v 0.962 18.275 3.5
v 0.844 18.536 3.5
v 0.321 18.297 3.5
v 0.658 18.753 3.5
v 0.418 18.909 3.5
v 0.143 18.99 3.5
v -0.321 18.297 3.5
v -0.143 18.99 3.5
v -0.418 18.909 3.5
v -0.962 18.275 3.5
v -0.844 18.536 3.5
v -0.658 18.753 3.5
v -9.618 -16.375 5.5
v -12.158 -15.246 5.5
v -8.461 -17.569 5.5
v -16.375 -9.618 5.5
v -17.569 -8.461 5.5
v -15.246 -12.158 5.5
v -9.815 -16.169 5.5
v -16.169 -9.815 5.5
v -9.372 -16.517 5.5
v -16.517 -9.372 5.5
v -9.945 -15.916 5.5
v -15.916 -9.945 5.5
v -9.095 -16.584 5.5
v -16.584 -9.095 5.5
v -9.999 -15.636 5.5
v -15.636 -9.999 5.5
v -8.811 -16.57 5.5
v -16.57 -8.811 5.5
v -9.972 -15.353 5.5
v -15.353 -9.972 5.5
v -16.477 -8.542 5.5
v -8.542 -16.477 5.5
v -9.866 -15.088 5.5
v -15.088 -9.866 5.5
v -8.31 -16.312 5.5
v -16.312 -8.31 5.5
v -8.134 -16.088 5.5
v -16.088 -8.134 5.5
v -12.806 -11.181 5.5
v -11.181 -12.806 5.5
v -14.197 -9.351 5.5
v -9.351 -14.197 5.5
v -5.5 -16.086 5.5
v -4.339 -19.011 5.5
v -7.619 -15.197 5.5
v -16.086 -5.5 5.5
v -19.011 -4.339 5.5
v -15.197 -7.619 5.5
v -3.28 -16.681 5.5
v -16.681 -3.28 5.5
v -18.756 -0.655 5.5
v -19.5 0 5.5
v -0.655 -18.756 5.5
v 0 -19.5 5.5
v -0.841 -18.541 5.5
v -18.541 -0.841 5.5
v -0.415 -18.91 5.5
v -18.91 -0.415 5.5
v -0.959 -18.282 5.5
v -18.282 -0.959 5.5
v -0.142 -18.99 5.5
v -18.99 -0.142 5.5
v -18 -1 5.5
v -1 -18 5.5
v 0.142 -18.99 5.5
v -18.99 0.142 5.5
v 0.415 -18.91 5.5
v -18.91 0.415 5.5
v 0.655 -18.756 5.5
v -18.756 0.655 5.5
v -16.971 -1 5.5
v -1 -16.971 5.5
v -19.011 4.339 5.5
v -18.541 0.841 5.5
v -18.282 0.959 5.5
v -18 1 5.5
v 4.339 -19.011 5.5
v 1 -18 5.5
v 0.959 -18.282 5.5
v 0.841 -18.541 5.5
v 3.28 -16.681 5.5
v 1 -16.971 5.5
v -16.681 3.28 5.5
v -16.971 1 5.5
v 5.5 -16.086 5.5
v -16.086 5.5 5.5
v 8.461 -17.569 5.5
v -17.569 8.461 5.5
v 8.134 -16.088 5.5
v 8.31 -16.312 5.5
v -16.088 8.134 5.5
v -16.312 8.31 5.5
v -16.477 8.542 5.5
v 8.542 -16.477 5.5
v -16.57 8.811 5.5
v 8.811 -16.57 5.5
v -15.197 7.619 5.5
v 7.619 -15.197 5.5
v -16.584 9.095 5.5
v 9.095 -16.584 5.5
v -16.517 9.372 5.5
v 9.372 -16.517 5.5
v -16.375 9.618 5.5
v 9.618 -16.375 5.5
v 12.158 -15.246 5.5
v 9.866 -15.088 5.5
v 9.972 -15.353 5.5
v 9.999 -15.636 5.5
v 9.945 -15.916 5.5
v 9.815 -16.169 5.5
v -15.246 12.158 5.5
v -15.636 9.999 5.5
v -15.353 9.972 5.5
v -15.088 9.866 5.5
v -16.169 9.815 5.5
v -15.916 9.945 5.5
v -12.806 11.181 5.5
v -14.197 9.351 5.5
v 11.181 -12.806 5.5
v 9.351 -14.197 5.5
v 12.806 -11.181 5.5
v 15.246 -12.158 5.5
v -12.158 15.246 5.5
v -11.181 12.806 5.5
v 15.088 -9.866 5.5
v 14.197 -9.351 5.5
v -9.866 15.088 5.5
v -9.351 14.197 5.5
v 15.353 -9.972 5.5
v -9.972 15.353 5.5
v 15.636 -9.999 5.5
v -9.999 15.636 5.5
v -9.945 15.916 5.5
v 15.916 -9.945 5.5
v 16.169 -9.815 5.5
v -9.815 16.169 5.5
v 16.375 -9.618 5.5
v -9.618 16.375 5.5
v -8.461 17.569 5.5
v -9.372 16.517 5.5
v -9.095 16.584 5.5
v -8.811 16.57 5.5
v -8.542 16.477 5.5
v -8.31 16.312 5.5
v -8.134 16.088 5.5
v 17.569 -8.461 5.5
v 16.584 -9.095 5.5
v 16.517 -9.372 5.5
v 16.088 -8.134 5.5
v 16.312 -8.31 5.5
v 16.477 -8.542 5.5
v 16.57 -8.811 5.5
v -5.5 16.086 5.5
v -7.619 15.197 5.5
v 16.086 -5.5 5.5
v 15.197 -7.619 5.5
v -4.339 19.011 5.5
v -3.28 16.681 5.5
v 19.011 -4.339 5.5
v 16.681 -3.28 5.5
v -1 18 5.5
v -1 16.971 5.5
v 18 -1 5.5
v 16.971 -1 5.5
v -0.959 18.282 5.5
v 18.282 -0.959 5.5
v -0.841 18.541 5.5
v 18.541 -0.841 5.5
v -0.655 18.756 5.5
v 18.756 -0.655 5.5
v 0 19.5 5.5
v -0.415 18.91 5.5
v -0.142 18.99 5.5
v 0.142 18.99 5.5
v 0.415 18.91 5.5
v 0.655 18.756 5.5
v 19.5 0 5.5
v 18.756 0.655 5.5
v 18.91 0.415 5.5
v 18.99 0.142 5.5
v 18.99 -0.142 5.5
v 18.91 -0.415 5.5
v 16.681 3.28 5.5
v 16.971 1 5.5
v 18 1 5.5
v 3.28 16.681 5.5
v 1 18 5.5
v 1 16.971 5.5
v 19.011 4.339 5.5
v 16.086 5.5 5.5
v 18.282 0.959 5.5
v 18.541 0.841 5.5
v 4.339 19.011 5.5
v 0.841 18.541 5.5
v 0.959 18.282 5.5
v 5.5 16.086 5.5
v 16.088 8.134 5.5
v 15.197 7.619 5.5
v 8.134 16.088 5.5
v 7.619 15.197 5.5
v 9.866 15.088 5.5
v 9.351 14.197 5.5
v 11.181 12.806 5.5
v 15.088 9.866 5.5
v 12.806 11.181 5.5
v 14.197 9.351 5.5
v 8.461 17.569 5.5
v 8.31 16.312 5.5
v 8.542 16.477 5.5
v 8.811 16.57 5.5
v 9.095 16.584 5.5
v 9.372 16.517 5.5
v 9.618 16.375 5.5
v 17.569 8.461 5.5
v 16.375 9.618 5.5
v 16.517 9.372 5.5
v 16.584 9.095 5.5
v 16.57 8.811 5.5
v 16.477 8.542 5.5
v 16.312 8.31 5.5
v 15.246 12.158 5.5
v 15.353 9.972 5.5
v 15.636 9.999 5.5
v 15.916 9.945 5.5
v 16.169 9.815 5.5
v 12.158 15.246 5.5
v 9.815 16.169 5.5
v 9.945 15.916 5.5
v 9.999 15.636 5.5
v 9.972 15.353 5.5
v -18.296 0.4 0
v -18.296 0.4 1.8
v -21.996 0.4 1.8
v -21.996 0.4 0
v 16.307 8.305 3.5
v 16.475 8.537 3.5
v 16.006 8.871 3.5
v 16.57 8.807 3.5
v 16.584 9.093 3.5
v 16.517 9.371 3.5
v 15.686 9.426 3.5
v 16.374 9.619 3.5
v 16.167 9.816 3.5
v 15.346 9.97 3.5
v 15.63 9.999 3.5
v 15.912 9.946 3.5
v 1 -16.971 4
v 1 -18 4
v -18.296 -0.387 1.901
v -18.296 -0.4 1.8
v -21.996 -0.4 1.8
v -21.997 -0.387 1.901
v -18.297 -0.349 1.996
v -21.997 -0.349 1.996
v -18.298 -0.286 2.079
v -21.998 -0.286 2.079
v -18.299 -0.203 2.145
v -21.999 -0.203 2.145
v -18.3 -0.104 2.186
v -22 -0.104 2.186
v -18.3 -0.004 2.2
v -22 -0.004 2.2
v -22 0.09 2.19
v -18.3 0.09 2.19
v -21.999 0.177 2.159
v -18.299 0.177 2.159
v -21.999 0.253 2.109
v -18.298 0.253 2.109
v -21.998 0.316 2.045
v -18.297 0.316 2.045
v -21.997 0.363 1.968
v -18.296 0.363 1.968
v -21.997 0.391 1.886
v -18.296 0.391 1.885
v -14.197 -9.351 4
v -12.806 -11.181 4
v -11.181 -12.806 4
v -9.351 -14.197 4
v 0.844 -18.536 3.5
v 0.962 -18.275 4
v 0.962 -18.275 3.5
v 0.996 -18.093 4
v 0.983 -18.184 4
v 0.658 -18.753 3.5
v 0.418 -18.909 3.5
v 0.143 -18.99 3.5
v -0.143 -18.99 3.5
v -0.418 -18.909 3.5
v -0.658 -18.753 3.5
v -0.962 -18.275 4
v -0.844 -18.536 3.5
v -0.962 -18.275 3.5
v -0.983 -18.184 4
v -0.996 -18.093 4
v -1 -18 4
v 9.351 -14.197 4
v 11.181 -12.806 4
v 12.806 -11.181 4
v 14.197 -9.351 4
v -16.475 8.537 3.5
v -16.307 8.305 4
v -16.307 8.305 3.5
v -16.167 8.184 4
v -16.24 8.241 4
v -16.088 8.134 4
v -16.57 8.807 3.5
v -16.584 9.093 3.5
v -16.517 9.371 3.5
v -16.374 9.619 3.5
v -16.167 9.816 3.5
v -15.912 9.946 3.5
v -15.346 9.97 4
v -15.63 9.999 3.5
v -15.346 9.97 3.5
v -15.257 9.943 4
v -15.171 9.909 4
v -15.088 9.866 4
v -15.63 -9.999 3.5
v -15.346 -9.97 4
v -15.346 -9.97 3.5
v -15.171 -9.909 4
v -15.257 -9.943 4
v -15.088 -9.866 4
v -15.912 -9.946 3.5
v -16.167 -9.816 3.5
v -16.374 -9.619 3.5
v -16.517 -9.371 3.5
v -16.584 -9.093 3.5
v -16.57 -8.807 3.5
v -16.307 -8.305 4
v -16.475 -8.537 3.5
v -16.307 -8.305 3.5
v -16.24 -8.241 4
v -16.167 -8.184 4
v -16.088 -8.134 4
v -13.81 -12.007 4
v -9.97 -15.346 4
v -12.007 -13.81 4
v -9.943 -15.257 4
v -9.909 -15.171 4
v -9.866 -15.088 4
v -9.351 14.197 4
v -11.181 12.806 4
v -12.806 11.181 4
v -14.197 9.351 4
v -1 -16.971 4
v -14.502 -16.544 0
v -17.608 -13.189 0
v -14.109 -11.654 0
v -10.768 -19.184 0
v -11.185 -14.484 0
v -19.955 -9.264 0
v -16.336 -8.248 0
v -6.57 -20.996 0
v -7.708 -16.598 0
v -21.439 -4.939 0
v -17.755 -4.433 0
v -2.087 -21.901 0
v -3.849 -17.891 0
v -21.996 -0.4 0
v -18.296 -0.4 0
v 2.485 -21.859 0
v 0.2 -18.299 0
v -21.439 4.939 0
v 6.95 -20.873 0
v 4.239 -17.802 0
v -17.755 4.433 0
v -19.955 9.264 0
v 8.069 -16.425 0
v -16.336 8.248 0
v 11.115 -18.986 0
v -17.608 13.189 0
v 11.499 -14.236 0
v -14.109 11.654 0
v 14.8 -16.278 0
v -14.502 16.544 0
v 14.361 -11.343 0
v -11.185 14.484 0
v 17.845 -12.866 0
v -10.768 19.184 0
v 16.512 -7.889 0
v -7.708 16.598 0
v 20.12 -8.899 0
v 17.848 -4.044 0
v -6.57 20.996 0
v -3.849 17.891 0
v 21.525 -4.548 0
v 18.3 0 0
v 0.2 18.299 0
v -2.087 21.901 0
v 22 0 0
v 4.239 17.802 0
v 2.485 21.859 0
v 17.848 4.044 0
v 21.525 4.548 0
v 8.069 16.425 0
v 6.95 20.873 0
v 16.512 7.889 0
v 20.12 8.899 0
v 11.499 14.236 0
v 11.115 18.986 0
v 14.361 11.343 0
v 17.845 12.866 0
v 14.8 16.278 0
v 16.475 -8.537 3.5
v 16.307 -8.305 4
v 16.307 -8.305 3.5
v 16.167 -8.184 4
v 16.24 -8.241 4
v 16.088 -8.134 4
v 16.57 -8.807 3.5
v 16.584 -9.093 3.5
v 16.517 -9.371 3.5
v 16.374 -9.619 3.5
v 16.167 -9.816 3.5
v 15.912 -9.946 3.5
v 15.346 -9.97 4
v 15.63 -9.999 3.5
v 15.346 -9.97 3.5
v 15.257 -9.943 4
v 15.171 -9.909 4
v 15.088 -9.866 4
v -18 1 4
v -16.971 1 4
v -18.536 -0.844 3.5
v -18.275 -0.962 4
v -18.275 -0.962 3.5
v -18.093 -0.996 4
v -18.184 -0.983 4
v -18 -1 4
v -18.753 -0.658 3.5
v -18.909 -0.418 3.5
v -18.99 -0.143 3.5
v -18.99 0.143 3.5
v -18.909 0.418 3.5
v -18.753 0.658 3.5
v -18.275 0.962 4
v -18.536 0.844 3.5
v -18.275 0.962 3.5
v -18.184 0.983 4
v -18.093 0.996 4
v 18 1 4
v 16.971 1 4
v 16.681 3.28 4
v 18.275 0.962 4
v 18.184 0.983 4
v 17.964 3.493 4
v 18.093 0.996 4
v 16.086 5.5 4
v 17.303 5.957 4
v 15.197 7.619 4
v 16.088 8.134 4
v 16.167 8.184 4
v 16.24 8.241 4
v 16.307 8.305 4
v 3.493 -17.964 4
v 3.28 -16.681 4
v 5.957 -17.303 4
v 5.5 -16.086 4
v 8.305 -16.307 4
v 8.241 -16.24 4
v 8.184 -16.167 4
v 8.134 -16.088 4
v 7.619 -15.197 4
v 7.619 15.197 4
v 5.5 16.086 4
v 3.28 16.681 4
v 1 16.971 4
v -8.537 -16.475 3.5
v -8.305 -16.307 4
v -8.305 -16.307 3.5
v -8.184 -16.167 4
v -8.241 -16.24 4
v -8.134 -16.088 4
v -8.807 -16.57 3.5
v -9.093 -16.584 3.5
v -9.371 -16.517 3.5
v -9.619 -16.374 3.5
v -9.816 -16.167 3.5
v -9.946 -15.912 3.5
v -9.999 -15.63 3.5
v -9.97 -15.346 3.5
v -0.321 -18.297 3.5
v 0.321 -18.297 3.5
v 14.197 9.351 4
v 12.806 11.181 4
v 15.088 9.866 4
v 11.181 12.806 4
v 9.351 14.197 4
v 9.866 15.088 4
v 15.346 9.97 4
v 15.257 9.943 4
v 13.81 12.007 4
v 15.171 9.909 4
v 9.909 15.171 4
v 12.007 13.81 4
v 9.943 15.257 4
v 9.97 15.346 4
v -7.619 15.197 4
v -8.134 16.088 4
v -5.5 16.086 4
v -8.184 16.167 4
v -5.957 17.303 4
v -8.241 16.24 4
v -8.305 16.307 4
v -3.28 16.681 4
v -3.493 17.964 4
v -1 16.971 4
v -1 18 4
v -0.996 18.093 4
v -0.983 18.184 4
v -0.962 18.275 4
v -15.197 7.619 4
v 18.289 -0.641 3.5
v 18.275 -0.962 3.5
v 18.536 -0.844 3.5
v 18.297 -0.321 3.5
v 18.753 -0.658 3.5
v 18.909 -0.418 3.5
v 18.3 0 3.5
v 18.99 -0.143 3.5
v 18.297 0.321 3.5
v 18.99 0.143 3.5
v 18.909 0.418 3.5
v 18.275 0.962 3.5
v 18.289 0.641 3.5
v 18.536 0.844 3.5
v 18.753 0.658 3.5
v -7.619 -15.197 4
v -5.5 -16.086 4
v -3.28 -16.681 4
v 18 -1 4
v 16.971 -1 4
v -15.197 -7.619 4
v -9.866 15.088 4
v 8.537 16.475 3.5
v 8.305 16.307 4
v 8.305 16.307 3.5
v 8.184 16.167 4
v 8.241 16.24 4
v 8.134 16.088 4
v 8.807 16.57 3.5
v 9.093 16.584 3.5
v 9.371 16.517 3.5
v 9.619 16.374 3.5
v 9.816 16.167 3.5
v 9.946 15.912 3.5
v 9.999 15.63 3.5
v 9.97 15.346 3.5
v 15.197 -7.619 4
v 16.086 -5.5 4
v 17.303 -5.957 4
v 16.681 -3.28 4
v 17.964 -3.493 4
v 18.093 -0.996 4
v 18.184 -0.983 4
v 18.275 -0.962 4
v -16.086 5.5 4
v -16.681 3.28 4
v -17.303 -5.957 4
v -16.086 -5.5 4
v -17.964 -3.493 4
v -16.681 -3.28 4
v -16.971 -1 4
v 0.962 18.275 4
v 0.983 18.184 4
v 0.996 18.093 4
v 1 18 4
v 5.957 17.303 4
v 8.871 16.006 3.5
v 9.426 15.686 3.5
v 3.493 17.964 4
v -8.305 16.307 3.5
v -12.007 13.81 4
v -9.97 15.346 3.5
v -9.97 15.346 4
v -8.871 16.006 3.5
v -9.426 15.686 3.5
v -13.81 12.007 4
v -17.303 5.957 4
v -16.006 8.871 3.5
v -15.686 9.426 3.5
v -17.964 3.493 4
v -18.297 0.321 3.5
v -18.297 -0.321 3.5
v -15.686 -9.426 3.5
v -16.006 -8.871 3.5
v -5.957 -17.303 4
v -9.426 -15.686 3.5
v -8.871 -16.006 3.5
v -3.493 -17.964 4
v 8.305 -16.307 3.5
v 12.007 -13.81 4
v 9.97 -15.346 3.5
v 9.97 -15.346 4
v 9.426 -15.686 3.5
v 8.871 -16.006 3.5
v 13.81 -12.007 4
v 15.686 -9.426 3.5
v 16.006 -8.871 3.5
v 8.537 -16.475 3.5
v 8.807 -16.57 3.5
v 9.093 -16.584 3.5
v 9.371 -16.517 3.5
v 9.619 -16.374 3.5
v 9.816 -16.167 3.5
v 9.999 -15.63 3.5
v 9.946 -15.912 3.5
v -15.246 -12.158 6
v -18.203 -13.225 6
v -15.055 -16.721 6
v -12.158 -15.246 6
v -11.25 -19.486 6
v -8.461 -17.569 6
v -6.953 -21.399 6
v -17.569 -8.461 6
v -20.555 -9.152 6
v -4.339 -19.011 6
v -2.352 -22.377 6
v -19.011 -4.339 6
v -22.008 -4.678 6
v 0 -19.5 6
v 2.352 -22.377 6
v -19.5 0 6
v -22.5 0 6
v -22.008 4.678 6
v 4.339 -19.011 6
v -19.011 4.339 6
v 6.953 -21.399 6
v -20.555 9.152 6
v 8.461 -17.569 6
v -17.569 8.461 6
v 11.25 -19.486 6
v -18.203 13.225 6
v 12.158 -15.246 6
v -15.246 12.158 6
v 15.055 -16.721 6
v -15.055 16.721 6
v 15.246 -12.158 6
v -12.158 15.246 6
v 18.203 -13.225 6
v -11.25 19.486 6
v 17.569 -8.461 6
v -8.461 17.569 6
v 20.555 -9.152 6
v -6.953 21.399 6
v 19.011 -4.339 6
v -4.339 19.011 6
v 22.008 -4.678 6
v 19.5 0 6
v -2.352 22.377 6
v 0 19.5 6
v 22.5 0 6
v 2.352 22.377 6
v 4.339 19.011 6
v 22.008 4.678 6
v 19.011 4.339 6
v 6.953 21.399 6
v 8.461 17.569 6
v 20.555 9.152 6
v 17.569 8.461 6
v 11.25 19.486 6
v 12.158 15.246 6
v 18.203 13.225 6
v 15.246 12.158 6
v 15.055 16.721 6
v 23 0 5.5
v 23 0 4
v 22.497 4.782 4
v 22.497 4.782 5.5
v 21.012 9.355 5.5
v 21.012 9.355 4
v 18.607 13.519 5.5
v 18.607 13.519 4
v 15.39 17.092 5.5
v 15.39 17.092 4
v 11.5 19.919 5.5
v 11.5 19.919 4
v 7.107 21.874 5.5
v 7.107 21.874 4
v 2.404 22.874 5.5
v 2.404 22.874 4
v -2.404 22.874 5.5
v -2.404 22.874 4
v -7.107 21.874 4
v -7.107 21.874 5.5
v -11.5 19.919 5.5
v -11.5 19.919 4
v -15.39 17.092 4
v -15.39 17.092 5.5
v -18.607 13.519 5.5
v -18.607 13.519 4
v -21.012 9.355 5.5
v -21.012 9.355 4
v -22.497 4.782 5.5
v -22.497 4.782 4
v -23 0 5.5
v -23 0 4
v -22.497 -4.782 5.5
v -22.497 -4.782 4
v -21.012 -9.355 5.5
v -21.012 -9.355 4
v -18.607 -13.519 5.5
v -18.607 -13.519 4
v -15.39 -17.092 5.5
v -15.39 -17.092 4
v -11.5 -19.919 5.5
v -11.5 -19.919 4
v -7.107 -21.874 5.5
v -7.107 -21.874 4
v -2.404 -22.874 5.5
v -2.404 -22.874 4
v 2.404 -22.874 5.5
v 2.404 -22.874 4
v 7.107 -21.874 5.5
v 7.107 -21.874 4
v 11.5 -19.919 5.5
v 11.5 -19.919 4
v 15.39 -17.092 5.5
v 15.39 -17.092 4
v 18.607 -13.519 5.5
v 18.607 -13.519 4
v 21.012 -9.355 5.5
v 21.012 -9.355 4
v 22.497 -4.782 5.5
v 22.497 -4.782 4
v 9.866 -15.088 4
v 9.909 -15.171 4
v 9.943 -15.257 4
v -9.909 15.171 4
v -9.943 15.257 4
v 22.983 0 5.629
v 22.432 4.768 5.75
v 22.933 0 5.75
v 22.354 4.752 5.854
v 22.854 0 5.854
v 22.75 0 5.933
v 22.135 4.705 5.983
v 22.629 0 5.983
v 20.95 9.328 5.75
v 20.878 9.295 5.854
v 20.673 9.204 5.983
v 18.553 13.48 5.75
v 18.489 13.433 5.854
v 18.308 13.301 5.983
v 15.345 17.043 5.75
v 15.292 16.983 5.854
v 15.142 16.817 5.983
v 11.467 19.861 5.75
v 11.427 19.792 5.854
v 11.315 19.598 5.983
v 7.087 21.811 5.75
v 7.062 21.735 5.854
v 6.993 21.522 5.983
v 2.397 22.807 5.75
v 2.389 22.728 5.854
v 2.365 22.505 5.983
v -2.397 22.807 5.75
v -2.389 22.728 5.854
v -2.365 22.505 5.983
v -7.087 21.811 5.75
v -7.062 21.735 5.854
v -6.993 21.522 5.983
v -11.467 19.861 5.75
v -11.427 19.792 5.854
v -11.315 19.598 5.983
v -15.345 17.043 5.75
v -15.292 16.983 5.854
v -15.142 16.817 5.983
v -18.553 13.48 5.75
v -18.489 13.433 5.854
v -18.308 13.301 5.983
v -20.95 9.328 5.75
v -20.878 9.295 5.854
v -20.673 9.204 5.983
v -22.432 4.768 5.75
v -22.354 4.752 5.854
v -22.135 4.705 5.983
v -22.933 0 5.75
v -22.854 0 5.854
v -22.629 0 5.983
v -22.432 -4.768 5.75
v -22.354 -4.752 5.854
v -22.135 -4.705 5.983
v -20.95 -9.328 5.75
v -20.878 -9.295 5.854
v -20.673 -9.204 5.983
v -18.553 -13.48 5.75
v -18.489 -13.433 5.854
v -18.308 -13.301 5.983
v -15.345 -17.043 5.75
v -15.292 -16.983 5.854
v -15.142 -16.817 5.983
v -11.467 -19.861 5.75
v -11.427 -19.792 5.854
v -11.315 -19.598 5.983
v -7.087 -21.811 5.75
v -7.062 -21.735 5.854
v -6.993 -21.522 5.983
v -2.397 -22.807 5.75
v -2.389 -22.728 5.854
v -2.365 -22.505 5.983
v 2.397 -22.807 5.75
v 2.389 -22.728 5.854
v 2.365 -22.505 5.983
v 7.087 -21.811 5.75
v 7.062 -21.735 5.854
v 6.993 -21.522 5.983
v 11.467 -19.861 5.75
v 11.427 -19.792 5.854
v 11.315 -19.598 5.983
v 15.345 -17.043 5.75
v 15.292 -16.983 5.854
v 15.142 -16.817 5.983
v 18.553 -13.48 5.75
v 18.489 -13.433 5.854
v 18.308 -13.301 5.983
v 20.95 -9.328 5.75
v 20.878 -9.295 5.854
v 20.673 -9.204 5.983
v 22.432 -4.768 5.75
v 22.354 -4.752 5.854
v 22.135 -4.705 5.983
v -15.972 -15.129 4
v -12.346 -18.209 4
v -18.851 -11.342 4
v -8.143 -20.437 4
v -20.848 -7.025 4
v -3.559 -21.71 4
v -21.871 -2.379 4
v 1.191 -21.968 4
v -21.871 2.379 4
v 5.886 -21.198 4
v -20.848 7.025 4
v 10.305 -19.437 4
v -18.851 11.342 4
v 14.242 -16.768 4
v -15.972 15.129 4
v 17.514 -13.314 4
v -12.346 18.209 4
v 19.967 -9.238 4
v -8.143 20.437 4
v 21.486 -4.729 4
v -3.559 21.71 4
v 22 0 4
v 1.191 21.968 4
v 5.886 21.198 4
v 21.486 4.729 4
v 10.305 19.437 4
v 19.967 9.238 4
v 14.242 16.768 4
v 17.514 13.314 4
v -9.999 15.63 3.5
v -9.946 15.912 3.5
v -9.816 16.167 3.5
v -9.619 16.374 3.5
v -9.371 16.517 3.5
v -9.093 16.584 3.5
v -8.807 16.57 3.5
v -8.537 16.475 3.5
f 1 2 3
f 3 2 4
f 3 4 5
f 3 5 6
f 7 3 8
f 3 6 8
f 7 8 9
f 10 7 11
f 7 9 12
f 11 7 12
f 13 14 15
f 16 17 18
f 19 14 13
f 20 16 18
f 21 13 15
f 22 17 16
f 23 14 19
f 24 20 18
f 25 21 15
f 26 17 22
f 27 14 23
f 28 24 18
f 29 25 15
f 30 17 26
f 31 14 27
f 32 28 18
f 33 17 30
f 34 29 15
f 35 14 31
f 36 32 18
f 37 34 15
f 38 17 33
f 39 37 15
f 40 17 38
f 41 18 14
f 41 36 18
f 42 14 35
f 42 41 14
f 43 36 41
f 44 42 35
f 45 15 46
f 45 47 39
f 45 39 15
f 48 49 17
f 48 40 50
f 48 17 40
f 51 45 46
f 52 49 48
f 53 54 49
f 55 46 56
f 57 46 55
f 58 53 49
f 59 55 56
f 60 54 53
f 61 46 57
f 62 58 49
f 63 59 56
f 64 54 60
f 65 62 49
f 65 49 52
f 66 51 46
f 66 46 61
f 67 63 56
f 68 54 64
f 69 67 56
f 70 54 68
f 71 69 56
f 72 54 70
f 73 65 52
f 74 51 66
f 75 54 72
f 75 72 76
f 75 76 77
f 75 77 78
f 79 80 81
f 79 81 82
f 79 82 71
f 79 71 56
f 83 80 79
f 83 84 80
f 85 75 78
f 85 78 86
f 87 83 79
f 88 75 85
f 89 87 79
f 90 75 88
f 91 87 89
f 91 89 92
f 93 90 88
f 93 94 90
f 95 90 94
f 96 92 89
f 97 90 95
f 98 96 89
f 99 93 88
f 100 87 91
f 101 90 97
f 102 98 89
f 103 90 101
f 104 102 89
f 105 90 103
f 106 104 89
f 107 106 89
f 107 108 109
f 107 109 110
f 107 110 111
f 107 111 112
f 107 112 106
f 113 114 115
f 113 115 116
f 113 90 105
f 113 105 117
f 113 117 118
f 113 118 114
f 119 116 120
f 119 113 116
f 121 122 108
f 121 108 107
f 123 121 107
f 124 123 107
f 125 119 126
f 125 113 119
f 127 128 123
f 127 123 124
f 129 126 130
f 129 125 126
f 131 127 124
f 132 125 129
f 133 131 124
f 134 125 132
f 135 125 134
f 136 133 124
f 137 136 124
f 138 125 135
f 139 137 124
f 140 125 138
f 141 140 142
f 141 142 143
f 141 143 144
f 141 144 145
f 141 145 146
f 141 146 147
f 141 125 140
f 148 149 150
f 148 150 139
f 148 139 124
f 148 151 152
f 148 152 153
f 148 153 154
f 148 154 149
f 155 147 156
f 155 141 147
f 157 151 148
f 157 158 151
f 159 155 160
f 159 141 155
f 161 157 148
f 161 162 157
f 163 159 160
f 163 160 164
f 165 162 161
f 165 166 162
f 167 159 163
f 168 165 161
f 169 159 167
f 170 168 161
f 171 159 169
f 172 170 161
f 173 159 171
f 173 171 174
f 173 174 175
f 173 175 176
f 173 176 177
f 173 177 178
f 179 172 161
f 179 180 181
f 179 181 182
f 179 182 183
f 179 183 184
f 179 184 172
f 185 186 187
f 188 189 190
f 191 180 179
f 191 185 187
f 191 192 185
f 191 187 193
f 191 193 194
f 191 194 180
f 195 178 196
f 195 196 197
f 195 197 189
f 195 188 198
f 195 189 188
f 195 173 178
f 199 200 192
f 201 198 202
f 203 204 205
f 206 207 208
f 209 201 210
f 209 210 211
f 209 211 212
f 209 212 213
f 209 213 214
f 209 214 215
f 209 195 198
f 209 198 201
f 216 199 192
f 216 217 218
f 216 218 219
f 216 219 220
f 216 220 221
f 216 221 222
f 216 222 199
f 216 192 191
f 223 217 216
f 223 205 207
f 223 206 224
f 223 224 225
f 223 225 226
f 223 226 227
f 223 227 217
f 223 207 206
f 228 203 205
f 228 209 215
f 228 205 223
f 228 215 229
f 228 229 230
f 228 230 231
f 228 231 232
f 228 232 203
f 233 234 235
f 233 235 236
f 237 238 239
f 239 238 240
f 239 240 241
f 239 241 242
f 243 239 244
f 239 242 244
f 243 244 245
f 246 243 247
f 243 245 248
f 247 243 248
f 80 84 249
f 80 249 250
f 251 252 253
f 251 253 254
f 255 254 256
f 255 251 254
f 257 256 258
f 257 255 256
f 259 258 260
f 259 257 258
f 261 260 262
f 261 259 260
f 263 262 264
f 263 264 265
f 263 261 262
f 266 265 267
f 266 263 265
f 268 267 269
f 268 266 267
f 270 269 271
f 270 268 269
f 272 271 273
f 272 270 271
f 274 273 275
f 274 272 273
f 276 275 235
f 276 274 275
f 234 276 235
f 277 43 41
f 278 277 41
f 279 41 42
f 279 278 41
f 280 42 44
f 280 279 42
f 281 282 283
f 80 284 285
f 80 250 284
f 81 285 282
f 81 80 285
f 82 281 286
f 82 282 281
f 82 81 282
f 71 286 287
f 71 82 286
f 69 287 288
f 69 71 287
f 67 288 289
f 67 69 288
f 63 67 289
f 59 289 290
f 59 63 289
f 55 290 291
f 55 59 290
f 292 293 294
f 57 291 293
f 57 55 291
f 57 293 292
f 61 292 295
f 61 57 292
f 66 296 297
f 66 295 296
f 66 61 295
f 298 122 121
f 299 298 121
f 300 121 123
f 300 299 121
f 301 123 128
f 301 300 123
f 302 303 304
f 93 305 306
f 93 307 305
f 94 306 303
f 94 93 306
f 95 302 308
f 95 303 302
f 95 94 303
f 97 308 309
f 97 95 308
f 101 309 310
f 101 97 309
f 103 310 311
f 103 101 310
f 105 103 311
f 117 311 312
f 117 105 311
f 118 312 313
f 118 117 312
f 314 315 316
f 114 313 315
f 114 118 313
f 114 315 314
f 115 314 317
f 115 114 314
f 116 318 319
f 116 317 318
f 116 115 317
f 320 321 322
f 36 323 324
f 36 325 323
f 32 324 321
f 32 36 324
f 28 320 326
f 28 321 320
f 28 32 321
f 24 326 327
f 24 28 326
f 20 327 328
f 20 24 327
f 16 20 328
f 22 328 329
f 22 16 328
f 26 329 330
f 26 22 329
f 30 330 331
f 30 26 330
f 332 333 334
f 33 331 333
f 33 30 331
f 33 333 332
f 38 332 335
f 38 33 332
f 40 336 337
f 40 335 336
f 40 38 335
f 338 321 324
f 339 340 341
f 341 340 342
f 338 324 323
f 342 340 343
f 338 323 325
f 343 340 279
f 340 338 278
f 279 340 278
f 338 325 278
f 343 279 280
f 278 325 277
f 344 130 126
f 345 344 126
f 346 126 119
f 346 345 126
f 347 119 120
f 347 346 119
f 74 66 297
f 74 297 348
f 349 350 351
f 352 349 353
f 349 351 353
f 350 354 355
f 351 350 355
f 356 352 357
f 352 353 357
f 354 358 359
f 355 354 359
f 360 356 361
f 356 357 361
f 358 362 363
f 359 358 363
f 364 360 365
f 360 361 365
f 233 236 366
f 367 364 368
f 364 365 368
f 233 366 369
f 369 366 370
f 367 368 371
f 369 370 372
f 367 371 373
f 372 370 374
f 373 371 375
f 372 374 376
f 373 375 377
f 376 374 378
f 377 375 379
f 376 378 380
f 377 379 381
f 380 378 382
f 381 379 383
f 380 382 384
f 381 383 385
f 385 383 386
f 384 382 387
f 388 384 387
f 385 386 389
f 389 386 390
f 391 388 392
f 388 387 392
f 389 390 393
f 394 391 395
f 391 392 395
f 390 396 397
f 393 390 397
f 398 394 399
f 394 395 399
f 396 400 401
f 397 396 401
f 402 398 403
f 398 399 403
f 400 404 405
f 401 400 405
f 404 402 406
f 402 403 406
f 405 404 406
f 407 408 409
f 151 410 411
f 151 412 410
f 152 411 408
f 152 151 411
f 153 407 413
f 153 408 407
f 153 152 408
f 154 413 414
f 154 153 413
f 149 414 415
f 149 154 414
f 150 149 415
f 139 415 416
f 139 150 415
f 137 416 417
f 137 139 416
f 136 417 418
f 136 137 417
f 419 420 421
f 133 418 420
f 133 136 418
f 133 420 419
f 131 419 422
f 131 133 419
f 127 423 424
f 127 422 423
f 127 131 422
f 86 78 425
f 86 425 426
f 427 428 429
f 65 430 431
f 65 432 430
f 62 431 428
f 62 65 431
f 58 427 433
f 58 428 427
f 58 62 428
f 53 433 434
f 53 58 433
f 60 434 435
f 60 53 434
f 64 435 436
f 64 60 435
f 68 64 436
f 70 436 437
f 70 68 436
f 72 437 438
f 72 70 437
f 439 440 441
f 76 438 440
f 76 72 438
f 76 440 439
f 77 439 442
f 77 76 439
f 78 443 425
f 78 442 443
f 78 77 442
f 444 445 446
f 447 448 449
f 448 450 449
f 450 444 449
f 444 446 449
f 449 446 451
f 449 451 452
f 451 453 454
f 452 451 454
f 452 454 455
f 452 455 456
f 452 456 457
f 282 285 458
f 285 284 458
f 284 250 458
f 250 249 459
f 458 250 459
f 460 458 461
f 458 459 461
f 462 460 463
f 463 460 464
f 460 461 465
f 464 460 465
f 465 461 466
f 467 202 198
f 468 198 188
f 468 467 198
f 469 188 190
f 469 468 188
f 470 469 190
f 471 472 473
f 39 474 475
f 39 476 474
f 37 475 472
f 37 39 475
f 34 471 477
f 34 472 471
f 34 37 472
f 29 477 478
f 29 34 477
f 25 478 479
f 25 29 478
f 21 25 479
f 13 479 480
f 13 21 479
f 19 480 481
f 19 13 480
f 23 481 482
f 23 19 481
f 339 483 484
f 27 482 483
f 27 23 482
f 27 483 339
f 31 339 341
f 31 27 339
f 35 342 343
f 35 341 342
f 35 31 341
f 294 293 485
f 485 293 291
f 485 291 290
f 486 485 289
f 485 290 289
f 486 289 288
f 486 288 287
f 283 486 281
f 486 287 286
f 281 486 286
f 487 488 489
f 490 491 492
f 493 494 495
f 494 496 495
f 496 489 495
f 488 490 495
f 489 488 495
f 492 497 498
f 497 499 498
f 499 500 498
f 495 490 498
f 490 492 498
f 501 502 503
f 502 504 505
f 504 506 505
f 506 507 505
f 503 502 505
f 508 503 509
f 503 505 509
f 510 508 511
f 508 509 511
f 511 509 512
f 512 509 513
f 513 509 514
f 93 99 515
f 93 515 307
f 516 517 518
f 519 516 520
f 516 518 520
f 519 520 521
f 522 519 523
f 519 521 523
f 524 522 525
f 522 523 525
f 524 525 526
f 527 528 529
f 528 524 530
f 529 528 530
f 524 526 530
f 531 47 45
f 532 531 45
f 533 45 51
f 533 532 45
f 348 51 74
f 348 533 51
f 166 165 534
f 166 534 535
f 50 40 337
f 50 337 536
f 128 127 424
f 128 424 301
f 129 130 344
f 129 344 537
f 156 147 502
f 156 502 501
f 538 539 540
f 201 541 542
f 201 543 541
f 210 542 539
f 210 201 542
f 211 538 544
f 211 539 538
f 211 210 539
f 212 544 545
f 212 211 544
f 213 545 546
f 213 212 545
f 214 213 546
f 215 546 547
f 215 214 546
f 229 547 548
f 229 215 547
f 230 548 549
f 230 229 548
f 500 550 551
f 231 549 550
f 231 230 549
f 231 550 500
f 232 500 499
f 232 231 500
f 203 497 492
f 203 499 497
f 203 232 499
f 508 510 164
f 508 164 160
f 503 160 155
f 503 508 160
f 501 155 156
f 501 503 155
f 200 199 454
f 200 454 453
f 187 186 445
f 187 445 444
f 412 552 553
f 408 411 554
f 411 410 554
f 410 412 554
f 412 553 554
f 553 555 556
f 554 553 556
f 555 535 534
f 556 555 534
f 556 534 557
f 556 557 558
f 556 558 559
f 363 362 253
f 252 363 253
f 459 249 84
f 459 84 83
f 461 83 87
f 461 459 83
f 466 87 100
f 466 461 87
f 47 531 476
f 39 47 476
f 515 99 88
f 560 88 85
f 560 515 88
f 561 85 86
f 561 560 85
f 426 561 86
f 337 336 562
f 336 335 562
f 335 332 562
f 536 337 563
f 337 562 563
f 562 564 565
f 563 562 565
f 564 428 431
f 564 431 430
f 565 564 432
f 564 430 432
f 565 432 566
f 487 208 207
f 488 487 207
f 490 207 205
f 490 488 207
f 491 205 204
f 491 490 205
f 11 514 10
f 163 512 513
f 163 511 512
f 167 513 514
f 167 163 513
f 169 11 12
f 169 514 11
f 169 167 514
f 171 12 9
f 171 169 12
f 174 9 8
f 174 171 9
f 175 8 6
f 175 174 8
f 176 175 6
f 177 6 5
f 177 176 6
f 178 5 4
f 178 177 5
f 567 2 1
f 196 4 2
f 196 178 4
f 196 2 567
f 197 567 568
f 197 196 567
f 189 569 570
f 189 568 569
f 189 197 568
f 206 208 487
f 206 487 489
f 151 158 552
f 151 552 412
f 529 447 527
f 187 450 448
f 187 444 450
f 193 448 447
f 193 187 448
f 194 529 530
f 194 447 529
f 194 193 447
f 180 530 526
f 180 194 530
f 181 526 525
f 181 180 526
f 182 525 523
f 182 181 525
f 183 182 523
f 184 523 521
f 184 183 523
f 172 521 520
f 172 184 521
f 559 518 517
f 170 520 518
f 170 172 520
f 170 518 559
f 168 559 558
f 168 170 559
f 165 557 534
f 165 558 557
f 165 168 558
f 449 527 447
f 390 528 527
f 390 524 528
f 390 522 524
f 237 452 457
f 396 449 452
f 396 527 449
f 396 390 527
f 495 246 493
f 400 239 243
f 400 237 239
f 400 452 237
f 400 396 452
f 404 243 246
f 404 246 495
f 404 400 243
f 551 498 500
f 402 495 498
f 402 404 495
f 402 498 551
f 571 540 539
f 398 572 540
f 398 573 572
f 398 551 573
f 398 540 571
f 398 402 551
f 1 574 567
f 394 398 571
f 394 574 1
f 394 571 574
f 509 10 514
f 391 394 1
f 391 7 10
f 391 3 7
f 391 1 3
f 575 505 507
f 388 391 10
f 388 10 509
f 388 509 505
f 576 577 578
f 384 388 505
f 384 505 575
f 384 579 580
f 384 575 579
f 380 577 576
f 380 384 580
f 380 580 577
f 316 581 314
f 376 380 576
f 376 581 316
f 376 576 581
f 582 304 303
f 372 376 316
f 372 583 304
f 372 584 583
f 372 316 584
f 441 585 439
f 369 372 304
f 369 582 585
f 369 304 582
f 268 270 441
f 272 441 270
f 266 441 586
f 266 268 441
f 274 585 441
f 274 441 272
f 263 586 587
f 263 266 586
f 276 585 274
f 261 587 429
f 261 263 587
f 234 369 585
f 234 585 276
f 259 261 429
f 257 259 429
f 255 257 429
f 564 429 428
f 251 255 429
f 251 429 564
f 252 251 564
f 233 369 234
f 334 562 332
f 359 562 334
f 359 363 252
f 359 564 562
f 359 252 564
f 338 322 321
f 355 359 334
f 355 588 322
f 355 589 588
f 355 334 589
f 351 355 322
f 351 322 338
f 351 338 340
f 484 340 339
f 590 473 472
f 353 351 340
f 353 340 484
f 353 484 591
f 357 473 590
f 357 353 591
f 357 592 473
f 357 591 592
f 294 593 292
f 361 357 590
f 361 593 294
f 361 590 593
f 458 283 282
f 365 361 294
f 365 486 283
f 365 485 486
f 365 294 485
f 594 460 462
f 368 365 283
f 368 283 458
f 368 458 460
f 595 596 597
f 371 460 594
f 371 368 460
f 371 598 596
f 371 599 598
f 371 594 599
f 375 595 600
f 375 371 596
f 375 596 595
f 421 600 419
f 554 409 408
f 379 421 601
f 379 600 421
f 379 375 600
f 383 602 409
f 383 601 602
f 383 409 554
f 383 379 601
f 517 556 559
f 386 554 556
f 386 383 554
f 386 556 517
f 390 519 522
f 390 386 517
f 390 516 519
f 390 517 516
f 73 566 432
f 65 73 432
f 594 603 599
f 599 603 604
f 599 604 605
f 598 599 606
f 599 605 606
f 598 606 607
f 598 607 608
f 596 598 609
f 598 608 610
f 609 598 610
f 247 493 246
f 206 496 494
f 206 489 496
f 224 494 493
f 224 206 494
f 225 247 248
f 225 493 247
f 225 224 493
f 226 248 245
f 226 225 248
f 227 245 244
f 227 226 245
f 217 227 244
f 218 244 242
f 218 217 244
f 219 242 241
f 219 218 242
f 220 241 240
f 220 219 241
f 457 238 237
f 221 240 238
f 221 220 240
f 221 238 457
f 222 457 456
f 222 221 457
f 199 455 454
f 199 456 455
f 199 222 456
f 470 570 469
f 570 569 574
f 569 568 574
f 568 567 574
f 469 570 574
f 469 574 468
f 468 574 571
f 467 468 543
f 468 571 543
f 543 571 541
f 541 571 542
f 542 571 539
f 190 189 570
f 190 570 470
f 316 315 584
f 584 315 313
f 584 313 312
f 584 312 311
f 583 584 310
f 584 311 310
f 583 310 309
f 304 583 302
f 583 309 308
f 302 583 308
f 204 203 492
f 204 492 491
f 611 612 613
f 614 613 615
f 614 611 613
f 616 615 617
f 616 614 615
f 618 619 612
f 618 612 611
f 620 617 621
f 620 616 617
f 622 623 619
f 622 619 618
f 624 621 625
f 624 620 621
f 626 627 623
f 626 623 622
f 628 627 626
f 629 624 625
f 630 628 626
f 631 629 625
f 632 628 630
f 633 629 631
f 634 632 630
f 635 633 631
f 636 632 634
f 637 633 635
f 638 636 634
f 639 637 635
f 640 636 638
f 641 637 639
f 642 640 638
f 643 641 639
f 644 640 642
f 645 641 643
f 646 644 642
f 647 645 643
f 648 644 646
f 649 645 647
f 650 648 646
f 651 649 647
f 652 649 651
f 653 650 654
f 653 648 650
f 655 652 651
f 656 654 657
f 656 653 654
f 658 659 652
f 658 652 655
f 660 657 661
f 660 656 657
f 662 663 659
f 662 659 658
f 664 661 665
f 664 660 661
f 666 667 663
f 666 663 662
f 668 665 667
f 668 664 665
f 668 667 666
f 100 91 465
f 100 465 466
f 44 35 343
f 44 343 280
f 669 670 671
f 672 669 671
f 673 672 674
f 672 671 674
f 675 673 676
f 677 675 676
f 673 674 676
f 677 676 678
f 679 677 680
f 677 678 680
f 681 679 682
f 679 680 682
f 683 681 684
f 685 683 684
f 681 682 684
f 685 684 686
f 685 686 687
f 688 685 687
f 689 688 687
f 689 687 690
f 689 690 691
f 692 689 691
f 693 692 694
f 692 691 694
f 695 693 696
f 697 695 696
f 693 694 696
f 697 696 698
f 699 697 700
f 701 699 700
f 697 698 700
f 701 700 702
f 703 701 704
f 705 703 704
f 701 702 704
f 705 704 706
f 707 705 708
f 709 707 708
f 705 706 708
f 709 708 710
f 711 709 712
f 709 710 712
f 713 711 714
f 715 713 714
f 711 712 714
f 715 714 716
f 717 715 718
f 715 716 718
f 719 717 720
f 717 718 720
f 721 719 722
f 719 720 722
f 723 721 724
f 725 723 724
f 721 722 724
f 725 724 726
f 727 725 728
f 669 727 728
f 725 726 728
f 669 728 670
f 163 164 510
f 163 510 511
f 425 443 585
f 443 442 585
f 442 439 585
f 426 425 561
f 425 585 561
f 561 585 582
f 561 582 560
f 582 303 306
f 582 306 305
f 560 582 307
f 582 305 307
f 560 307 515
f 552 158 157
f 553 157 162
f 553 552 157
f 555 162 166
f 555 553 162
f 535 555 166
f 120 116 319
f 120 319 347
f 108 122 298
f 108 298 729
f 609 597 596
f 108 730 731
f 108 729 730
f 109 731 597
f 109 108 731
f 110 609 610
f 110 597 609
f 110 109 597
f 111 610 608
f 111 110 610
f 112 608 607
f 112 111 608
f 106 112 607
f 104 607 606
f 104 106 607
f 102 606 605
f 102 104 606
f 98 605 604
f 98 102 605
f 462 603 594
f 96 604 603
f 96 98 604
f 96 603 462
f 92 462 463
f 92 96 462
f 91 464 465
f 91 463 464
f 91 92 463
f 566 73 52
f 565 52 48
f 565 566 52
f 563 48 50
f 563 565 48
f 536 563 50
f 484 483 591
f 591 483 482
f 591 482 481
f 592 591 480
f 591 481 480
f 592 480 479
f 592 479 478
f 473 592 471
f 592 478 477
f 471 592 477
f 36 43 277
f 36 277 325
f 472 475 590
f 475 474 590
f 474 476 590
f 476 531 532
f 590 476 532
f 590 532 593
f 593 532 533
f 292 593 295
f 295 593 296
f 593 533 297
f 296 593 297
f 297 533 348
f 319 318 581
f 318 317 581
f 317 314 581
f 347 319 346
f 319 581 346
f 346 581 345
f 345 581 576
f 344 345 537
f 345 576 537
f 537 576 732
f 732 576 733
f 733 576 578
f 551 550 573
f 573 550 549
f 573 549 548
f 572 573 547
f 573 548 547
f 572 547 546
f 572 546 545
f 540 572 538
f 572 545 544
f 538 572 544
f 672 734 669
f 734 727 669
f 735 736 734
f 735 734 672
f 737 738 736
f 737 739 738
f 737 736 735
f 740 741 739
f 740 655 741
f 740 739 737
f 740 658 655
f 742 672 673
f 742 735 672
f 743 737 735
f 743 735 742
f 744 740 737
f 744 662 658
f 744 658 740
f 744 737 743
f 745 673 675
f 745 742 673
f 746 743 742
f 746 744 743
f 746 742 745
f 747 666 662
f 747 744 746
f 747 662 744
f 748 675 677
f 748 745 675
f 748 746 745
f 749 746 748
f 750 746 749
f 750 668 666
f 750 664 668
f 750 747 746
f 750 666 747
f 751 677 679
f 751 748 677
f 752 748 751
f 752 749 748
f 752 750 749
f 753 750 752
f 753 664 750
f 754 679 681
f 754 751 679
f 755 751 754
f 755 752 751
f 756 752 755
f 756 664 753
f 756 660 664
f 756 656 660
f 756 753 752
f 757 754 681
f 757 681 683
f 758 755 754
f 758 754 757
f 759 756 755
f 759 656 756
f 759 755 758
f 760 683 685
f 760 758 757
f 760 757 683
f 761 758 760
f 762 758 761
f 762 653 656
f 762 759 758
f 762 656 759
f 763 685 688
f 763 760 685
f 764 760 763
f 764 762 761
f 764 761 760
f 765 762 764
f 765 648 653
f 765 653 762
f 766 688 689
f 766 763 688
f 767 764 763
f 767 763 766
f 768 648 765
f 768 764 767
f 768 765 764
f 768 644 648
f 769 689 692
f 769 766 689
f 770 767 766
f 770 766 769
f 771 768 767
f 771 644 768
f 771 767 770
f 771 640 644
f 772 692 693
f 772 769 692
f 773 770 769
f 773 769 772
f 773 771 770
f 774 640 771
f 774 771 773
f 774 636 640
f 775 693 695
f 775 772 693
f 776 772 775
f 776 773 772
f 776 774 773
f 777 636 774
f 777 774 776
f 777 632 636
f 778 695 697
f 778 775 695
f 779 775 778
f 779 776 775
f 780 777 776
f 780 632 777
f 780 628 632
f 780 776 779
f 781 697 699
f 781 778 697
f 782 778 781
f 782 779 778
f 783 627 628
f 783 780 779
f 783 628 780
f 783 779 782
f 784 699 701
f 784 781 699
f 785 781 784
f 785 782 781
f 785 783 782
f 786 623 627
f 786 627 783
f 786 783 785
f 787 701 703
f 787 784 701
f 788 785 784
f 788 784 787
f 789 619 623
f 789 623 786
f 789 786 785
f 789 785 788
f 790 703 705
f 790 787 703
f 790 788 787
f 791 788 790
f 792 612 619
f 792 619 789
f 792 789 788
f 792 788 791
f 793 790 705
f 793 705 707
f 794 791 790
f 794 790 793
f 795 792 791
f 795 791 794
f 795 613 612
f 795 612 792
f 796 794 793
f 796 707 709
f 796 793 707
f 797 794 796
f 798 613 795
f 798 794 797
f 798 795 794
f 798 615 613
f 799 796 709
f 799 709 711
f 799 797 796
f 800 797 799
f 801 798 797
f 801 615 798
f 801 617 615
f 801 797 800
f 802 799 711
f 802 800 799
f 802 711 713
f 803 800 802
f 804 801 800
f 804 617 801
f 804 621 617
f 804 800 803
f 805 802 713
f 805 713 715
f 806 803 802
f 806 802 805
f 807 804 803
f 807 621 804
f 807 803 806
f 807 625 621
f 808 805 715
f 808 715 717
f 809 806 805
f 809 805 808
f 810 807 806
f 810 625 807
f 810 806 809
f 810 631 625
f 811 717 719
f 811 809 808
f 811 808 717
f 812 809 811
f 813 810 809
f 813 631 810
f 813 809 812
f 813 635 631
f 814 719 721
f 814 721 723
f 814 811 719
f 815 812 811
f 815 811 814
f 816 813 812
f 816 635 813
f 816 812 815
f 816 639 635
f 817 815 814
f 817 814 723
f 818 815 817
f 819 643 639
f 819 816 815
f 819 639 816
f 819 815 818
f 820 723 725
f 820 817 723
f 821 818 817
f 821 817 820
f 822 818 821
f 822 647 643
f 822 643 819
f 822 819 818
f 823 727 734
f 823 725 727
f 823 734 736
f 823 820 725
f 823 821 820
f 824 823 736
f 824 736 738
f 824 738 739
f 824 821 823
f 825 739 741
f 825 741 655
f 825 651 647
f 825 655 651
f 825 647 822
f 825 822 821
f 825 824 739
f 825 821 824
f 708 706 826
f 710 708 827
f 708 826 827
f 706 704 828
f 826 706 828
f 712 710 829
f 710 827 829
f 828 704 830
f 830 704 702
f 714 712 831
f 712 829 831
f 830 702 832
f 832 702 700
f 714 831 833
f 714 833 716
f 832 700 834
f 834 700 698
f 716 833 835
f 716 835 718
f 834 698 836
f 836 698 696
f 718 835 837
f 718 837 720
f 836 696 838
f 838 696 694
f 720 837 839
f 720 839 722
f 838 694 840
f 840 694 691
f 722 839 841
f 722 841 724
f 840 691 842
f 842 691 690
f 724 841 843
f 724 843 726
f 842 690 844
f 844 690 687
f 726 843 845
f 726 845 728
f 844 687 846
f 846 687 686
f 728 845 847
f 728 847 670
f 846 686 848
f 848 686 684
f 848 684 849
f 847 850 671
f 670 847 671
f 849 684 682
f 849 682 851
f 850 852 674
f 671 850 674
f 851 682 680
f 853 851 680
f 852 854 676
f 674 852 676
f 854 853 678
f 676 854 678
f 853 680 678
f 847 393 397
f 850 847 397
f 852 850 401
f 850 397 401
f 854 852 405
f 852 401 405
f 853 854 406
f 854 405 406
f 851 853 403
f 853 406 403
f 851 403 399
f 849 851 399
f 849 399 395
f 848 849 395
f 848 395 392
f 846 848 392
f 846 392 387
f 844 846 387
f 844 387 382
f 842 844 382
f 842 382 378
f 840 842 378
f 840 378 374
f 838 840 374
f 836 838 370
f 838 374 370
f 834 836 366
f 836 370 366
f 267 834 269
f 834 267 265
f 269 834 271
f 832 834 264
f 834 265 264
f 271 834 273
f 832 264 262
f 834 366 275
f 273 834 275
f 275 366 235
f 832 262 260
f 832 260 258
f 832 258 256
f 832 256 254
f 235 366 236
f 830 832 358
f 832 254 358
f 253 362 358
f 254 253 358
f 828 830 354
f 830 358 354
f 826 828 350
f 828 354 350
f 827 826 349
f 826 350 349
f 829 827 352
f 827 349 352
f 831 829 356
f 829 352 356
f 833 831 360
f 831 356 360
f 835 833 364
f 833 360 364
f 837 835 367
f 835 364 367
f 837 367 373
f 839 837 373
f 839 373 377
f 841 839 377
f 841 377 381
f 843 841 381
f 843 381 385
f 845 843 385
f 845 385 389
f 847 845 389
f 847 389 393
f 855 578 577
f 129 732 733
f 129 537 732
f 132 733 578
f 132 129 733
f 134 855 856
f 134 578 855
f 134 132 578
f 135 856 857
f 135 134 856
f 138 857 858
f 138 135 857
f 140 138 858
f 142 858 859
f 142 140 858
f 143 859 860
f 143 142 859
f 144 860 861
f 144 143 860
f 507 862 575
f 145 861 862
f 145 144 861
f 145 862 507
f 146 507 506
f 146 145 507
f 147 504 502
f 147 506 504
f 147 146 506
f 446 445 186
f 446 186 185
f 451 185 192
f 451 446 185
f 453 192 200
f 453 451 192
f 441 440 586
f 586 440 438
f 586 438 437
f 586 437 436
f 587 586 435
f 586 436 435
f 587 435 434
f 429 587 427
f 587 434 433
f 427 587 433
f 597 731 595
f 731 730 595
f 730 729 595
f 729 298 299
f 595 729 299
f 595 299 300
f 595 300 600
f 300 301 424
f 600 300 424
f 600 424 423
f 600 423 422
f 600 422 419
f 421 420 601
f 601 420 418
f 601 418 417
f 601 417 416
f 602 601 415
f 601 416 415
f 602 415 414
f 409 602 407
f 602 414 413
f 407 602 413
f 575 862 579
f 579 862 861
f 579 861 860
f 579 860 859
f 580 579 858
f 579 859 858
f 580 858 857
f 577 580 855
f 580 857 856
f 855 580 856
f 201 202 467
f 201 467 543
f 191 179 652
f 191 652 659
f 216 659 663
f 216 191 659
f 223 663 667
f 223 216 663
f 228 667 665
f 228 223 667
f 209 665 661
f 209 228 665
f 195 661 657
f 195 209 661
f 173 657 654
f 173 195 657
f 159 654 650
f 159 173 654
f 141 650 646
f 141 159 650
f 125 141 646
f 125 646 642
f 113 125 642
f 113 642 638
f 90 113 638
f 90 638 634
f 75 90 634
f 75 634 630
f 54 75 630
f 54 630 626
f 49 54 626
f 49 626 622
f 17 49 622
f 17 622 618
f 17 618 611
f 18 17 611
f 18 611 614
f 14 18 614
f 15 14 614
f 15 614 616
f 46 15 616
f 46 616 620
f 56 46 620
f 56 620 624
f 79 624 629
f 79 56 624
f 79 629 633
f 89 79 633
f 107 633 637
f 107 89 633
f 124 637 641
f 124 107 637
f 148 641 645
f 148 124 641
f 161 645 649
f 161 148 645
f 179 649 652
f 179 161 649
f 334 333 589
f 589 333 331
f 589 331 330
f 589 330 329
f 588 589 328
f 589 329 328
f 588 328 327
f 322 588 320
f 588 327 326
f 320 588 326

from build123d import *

# Parameters (mm, degrees)
ESQUISSE1_R                  = 22
ESQUISSE1_R_2                = 18.3
BOSS_EXTRU_1_DEPTH           = 4
ESQUISSE2_R                  = 23
ESQUISSE2_R_2                = 19.5
BOSS_EXTRU_2_DEPTH           = 2
CONG_1_R                     = 0.5
ENL_V_MAT_EXTRU_1_REACH      = 25
ESQUISSE4_R                  = 19.5
ESQUISSE4_R_2                = 17
BOSS_EXTRU_3_DEPTH           = 1.5
ENL_V_MAT_EXTRU_2_DEPTH      = 2
R_P_TITION_CIRCULAIRE1_COUNT = 12


with BuildPart() as part:
    # Esquisse1 → Boss.-Extru.1 (new body)
    with BuildSketch(Plane.XY):
        Circle(ESQUISSE1_R)
        Circle(ESQUISSE1_R_2, mode=Mode.SUBTRACT)
    extrude(amount=BOSS_EXTRU_1_DEPTH)

    # Esquisse2 → Boss.-Extru.2 (add)
    with BuildSketch(Plane.XY.offset(4)):
        Circle(ESQUISSE2_R)
        Circle(ESQUISSE2_R_2, mode=Mode.SUBTRACT)
    extrude(amount=BOSS_EXTRU_2_DEPTH)

    # Congé1
    cong_1_edges = [part.edges().sort_by_distance(p)[0] for p in [
        (-23, 0, 6),
    ]]
    fillet(cong_1_edges, radius=CONG_1_R)

    # Esquisse3 → Enlèv. mat.-Extru.1 (cut, up to next)
    with BuildSketch(Plane(origin=(0, 0, 0), x_dir=(0, 0, -1), z_dir=(1, 0, 0)), mode=Mode.PRIVATE) as enl_v_mat_extru_1_sk1:
        with BuildLine():
            Line((0, -0.4), (-1.8, -0.4))
            ThreePointArc((-1.8, -0.4), (-2.2, 0), (-1.8, 0.4))
            Line((-1.8, 0.4), (0, 0.4))
            ThreePointArc((0, 0.4), (0.4, 0), (0, -0.4))
        make_face()
    enl_v_mat_extru_1_tool1 = extrude(enl_v_mat_extru_1_sk1.sketch, amount=-ENL_V_MAT_EXTRU_1_REACH, mode=Mode.PRIVATE) & part.part
    add(enl_v_mat_extru_1_tool1.solids().sort_by_distance((0, 0, 0.9))[0], mode=Mode.SUBTRACT)

    # Esquisse4 → Boss.-Extru.3 (add)
    with BuildSketch(Plane.XY.offset(4)):
        Circle(ESQUISSE4_R)
        Circle(ESQUISSE4_R_2, mode=Mode.SUBTRACT)
    extrude(amount=BOSS_EXTRU_3_DEPTH)

    # Esquisse5 → Enlèv. mat.-Extru.2 (cut)
    with BuildSketch(Plane.XY.offset(5.5)):
        with BuildLine():
            Line((-1, 15.094284231), (-1, 18))
            ThreePointArc((-1, 18), (0, 19), (1, 18))
            Line((1, 18), (1, 15.094284231))
            ThreePointArc((1, 15.094284231), (0, 14.094284231), (-1, 15.094284231))
        make_face()
    enl_v_mat_extru_2 = extrude(amount=-ENL_V_MAT_EXTRU_2_DEPTH, mode=Mode.SUBTRACT)

    # Répétition circulaire1: Enlèv. mat.-Extru.2 ×12 about axis
    r_p_tition_circulaire1_axis = Axis((0, 0, 0), (0, 0, 1))
    for i in range(1, R_P_TITION_CIRCULAIRE1_COUNT):
        add(enl_v_mat_extru_2.rotate(r_p_tition_circulaire1_axis, i * 360 / R_P_TITION_CIRCULAIRE1_COUNT), mode=Mode.SUBTRACT)


solid = part.part
